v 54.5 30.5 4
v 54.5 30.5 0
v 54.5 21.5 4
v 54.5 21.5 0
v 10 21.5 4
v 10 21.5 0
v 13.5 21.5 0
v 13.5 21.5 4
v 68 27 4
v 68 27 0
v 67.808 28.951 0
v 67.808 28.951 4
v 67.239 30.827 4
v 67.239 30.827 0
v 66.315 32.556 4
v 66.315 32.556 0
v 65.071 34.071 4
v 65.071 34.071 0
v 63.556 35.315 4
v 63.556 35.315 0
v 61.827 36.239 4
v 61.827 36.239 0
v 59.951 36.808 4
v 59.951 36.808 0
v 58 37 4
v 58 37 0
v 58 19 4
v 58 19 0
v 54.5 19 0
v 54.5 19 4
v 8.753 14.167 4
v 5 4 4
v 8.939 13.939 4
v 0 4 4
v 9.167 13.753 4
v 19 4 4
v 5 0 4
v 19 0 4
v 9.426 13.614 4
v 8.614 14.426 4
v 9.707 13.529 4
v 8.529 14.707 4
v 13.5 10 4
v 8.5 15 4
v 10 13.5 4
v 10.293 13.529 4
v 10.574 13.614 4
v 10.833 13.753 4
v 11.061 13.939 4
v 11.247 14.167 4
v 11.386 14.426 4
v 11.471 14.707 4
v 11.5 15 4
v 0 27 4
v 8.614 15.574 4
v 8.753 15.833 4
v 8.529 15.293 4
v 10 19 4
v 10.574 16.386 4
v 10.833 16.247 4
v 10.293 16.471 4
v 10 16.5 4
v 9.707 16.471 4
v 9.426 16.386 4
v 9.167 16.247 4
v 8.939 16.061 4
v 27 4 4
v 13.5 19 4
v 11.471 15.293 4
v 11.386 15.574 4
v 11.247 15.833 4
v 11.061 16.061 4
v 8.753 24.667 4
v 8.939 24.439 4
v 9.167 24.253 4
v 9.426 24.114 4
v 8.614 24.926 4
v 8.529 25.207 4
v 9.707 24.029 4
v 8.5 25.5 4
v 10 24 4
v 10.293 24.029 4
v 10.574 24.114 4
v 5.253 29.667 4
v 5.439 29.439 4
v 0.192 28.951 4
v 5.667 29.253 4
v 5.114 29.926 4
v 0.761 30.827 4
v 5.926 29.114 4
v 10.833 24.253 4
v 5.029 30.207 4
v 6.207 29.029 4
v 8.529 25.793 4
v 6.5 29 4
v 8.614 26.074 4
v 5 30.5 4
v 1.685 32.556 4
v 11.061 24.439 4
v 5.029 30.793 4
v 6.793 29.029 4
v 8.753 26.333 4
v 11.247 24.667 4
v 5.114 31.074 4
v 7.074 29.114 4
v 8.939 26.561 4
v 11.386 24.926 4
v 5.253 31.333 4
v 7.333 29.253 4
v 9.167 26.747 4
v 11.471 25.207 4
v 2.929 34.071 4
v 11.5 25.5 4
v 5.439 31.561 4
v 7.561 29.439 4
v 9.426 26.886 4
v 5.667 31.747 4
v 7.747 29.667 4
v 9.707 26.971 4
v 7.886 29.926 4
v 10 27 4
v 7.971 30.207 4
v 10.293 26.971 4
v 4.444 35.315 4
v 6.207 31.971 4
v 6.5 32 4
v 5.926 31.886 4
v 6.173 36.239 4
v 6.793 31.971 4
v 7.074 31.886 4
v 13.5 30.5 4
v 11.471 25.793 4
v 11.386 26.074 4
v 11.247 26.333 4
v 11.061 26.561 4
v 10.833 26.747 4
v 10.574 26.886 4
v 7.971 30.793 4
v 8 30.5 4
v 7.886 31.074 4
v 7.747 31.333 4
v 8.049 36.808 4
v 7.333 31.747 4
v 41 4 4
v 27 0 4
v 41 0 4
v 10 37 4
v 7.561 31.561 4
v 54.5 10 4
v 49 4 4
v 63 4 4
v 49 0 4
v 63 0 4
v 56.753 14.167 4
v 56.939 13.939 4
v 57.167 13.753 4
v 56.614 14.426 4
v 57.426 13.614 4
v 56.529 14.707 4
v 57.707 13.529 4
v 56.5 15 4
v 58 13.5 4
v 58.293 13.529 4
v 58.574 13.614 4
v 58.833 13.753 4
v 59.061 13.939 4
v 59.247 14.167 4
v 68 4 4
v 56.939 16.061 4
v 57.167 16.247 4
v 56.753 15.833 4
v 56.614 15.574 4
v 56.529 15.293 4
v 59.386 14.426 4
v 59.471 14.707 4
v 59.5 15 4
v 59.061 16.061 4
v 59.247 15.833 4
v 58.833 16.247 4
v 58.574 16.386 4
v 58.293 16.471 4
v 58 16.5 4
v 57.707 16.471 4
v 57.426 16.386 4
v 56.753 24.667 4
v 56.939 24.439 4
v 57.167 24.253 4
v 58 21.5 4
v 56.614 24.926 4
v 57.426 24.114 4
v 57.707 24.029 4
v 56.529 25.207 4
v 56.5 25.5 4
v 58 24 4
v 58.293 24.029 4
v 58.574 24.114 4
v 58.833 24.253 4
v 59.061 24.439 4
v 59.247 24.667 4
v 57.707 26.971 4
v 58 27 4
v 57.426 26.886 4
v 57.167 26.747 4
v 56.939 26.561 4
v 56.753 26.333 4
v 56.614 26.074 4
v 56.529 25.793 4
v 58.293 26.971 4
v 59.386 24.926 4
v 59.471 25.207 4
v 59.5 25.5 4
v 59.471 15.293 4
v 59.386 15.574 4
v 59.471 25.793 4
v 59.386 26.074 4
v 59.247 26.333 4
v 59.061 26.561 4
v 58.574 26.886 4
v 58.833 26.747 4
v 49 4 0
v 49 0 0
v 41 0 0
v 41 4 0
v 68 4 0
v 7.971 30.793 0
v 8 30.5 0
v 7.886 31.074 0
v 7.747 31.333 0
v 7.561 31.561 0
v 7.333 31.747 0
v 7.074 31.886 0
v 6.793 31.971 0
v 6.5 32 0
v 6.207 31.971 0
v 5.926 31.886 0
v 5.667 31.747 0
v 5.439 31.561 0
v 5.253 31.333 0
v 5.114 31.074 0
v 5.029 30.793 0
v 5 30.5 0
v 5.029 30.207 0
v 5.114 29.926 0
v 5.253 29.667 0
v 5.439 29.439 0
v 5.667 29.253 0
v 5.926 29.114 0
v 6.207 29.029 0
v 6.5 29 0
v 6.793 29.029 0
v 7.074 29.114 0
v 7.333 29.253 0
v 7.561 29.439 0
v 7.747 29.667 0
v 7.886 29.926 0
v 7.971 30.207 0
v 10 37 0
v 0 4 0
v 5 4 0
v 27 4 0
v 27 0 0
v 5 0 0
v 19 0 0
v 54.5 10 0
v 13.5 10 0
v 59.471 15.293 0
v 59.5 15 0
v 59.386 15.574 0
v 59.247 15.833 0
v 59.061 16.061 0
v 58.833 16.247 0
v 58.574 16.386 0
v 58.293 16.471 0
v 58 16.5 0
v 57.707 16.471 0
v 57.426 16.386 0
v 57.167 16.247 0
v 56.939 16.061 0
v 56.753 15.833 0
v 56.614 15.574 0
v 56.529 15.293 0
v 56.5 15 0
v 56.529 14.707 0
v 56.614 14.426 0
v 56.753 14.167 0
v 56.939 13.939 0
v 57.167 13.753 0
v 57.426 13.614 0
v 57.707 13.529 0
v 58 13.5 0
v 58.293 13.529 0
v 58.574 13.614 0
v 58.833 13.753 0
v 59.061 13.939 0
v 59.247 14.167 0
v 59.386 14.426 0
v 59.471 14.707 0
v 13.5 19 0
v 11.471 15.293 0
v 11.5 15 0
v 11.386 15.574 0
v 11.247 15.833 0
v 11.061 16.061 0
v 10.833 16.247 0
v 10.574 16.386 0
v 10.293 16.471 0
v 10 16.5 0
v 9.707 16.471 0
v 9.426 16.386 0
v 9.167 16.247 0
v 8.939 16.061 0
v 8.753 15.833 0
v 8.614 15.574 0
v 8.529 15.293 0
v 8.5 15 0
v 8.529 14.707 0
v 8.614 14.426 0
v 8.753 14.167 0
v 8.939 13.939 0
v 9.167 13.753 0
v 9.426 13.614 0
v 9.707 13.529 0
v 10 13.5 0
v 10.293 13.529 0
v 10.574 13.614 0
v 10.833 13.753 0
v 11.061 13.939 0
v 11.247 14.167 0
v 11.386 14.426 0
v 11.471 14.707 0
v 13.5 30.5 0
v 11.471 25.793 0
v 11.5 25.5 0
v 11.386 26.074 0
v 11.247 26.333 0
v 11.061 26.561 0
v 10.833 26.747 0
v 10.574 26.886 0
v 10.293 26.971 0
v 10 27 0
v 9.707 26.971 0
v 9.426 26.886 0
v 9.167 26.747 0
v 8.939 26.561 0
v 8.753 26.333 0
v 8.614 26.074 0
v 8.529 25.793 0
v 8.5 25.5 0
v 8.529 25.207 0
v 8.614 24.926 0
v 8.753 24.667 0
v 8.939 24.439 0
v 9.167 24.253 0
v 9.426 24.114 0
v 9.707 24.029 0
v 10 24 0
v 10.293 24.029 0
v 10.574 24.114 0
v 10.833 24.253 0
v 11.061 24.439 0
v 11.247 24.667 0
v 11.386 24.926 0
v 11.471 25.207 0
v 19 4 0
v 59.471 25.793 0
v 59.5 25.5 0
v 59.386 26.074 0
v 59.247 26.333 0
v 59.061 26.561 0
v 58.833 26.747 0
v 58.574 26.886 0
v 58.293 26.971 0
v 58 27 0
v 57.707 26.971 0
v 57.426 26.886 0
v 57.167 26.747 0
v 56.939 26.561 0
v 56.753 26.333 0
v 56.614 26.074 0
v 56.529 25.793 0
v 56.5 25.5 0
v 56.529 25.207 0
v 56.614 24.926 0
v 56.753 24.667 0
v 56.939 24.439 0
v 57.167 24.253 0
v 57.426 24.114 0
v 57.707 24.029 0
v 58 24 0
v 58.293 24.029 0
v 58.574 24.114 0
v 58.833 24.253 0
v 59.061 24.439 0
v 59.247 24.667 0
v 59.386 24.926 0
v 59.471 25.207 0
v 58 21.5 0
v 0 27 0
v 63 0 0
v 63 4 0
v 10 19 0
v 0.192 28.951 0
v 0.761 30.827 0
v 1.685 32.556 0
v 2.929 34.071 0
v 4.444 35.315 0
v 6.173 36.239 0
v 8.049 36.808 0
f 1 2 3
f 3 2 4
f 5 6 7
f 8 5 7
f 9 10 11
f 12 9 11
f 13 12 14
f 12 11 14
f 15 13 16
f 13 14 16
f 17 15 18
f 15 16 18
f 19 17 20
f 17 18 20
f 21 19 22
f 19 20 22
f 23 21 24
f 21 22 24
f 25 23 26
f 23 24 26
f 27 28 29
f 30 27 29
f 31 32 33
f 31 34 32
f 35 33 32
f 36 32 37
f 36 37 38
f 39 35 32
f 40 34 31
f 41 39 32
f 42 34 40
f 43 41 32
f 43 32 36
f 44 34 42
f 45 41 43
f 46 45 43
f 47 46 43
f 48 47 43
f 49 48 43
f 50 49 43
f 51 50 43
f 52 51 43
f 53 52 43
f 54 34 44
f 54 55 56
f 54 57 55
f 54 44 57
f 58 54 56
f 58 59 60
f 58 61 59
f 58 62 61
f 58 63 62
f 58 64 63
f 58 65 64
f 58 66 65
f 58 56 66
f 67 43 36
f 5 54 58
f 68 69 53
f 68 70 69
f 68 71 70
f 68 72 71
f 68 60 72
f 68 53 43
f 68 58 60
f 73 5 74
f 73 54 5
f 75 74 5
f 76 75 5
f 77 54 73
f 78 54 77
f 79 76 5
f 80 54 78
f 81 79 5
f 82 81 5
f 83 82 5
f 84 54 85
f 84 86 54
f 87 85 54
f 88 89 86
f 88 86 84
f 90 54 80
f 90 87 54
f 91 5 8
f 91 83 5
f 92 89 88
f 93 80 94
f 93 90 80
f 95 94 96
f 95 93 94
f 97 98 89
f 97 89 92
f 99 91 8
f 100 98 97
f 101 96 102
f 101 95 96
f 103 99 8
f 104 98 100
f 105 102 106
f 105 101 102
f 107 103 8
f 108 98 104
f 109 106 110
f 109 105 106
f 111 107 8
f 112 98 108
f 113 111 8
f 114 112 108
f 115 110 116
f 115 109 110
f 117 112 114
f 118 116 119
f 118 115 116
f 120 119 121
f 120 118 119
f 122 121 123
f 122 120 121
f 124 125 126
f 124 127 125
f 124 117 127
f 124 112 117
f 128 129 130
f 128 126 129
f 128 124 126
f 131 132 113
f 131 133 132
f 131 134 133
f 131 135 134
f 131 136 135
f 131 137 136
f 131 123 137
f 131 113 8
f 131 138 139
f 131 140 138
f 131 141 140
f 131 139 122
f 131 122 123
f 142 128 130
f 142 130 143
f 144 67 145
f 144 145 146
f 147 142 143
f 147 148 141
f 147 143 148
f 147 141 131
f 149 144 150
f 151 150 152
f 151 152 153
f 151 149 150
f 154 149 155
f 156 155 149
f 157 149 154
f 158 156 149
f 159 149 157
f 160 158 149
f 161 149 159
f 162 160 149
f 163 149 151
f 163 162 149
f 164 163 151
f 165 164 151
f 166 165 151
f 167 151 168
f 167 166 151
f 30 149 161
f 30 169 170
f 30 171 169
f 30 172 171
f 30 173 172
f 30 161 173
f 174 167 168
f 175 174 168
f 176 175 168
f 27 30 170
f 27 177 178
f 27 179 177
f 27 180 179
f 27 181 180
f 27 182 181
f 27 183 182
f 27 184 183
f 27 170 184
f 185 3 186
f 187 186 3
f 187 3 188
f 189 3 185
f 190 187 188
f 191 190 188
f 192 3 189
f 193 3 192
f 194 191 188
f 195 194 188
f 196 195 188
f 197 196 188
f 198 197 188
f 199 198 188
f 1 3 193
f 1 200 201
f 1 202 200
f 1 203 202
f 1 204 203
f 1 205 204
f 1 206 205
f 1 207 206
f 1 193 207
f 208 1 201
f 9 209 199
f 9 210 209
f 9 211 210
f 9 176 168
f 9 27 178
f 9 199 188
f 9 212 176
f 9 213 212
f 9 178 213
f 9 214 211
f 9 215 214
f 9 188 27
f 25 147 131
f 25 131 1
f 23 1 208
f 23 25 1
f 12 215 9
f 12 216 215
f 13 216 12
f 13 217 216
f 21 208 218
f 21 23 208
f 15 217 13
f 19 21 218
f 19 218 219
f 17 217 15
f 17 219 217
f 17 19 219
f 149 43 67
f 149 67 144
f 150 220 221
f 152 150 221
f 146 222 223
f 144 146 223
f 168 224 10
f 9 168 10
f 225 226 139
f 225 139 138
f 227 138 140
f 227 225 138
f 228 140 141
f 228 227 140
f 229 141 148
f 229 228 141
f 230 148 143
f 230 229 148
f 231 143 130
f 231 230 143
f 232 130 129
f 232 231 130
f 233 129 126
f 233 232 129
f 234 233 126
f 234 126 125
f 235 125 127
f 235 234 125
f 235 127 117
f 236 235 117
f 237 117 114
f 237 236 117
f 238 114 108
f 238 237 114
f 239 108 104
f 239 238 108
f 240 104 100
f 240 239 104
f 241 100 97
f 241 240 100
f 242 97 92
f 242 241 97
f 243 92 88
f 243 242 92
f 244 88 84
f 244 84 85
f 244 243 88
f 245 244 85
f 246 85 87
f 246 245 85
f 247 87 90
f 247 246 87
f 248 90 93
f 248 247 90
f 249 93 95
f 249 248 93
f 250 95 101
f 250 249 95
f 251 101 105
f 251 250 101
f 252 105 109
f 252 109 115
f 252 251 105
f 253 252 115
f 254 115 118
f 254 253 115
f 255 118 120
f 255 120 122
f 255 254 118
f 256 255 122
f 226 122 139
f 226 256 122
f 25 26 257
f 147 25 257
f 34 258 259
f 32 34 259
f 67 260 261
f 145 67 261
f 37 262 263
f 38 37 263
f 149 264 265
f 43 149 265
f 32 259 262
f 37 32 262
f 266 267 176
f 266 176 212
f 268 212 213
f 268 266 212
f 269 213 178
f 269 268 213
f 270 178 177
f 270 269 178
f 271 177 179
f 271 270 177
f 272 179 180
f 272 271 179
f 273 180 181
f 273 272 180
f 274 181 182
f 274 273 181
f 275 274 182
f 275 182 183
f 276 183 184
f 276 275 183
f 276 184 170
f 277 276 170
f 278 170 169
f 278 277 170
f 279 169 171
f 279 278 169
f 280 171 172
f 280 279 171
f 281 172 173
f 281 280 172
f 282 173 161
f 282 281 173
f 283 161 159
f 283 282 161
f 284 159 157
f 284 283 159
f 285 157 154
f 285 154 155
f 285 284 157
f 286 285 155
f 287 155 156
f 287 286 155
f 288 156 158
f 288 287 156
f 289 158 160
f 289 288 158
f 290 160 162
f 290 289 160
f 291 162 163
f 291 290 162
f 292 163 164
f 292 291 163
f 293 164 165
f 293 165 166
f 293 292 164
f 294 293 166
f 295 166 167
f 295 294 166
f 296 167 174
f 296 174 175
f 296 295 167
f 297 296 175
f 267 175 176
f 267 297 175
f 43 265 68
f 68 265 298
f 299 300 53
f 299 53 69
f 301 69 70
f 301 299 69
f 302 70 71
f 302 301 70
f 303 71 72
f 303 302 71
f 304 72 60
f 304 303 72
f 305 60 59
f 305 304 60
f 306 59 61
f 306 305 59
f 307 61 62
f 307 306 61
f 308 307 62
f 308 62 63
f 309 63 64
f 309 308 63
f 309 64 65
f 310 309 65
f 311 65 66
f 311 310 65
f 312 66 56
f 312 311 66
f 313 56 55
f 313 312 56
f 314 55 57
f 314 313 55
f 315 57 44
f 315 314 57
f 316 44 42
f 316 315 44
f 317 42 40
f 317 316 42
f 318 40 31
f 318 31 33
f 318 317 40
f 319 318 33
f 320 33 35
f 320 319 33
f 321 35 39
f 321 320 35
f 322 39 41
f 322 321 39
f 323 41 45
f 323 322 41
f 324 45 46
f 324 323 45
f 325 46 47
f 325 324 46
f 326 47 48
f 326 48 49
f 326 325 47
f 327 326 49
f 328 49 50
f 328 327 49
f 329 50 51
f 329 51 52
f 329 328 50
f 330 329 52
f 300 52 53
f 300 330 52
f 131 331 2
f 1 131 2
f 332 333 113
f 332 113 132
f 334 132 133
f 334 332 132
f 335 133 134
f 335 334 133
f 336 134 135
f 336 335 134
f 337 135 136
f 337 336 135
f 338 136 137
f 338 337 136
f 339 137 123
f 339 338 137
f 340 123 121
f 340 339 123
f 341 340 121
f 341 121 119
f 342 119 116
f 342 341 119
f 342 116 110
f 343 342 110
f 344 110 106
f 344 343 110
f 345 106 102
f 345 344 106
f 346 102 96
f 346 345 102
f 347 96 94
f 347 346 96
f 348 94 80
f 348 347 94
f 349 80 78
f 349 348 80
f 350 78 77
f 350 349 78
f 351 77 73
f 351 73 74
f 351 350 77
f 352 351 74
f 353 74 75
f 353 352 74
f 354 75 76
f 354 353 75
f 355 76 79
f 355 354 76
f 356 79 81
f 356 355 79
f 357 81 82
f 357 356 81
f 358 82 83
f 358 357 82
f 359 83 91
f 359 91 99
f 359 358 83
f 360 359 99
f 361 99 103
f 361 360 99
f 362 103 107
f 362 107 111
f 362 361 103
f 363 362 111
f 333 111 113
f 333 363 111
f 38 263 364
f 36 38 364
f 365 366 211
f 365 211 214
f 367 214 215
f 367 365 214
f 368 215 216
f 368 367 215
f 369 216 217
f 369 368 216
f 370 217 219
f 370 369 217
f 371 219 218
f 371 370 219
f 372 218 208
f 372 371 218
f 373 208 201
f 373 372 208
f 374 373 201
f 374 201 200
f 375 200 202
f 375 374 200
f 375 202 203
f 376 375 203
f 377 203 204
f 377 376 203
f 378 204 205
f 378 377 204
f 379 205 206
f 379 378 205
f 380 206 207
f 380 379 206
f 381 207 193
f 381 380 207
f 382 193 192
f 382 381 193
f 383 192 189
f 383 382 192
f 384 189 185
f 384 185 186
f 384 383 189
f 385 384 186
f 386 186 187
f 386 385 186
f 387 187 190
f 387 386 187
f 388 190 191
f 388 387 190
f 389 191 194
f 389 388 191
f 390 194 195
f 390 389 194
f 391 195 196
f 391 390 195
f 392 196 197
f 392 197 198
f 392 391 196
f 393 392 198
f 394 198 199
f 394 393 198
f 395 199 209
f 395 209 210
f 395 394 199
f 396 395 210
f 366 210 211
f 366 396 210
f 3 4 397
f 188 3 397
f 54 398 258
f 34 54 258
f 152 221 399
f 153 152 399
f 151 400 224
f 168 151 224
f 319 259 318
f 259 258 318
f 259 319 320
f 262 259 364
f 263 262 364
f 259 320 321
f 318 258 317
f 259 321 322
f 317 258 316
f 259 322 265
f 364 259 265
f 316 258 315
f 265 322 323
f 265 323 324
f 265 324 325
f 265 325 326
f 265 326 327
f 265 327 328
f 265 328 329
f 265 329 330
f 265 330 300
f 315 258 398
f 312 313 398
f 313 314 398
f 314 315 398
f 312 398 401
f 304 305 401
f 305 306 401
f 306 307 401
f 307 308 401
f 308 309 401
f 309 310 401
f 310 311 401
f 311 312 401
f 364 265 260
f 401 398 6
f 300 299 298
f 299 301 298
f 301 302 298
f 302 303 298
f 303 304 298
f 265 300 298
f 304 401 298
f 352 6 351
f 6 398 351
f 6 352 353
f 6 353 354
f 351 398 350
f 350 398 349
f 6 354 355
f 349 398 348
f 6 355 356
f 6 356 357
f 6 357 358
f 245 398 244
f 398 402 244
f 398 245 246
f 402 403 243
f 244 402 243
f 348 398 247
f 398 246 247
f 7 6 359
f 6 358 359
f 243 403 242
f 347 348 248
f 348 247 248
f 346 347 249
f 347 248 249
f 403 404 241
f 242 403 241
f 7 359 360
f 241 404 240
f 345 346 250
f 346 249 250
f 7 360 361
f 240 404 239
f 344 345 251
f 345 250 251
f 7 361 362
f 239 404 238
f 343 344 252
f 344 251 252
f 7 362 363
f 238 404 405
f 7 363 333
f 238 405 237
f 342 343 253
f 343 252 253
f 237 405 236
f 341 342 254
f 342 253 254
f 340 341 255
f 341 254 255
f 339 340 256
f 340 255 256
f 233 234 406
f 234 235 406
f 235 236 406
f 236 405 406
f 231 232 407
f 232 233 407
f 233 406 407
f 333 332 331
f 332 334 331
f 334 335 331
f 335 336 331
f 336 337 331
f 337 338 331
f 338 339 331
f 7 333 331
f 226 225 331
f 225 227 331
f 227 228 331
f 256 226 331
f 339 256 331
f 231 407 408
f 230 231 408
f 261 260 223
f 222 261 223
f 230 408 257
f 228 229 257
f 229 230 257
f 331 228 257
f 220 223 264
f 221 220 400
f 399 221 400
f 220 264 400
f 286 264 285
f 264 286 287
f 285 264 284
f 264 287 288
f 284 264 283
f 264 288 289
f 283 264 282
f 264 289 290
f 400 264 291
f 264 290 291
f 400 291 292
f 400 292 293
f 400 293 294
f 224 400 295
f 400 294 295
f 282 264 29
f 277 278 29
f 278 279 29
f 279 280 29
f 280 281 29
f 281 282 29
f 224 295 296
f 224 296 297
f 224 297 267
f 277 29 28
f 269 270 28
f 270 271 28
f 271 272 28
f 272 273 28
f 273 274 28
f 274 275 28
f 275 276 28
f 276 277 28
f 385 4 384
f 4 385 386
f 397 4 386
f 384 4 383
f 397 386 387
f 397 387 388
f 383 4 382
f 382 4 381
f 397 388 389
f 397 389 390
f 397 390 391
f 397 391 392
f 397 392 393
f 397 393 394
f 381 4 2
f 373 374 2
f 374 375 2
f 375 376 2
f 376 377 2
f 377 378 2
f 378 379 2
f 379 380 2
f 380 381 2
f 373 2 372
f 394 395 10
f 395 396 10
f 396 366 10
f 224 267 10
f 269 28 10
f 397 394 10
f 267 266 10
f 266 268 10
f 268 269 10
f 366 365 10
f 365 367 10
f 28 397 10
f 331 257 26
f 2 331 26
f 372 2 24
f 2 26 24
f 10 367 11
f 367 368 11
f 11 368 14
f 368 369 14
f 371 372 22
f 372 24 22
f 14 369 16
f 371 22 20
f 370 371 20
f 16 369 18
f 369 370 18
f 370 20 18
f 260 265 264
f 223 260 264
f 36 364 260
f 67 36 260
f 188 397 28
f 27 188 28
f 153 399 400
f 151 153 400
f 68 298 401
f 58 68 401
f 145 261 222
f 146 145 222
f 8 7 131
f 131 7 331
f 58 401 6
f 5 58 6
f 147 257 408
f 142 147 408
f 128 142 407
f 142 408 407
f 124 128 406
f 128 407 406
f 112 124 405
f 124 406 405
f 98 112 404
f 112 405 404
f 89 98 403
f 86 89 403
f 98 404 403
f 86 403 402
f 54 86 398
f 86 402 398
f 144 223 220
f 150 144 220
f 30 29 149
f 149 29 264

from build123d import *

# Parameters (mm, degrees)
SKETCH1_R           = 1.5
BOSS_EXTRUDE1_DEPTH = 4


with BuildPart() as part:
    # Sketch1 → Boss-Extrude1 (new body)
    with BuildSketch(Plane.XY):
        with BuildLine():
            Line((49.000000342, 3.999999998), (49.000000342, -2e-09))
            Line((49.000000342, -2e-09), (63.000000342, -2e-09))
            Line((63.000000342, -2e-09), (63.000000342, 3.999999998))
            Line((63.000000342, 3.999999998), (68.000000342, 3.999999998))
            Line((68.000000342, 3.999999998), (68.000000342, 26.999999998))
            ThreePointArc((68.000000342, 26.999999998), (65.071068153, 34.07106781), (58.000000342, 36.999999998))
            Line((58.000000342, 36.999999998), (10.000000342, 36.999999998))
            ThreePointArc((10.000000342, 36.999999998), (2.92893253, 34.07106781), (3.42e-07, 26.999999998))
            Line((3.42e-07, 26.999999998), (3.42e-07, 3.999999998))
            Line((3.42e-07, 3.999999998), (5.000000342, 3.999999998))
            Line((5.000000342, 3.999999998), (5.000000342, -2e-09))
            Line((5.000000342, -2e-09), (19.000000342, -2e-09))
            Line((19.000000342, -2e-09), (19.000000342, 3.999999998))
            Line((19.000000342, 3.999999998), (27.000000342, 3.999999998))
            Line((27.000000342, 3.999999998), (27.000000342, -2e-09))
            Line((27.000000342, -2e-09), (41.000000342, -2e-09))
            Line((41.000000342, -2e-09), (41.000000342, 3.999999998))
            Line((41.000000342, 3.999999998), (49.000000342, 3.999999998))
        make_face()
        with Locations((10.000000342, 14.999999998)):
            Circle(SKETCH1_R, mode=Mode.SUBTRACT)
        with Locations((10.000000342, 25.499999998)):
            Circle(SKETCH1_R, mode=Mode.SUBTRACT)
        with Locations((58.000000342, 14.999999998)):
            Circle(SKETCH1_R, mode=Mode.SUBTRACT)
        with Locations((58.000000342, 25.499999998)):
            Circle(SKETCH1_R, mode=Mode.SUBTRACT)
        with Locations((6.500000342, 30.499999998)):
            Circle(SKETCH1_R, mode=Mode.SUBTRACT)
        Polygon((54.500000342, 30.499999998), (54.500000342, 21.499999998), (58.000000342, 21.499999998), (58.000000342, 18.999999998), (54.500000342, 18.999999998), (54.500000342, 9.999999998), (13.500000342, 9.999999998), (13.500000342, 18.999999998), (10.000000342, 18.999999998), (10.000000342, 21.499999998), (13.500000342, 21.499999998), (13.500000342, 30.499999998), align=None, mode=Mode.SUBTRACT)
    extrude(amount=BOSS_EXTRUDE1_DEPTH)


solid = part.part
